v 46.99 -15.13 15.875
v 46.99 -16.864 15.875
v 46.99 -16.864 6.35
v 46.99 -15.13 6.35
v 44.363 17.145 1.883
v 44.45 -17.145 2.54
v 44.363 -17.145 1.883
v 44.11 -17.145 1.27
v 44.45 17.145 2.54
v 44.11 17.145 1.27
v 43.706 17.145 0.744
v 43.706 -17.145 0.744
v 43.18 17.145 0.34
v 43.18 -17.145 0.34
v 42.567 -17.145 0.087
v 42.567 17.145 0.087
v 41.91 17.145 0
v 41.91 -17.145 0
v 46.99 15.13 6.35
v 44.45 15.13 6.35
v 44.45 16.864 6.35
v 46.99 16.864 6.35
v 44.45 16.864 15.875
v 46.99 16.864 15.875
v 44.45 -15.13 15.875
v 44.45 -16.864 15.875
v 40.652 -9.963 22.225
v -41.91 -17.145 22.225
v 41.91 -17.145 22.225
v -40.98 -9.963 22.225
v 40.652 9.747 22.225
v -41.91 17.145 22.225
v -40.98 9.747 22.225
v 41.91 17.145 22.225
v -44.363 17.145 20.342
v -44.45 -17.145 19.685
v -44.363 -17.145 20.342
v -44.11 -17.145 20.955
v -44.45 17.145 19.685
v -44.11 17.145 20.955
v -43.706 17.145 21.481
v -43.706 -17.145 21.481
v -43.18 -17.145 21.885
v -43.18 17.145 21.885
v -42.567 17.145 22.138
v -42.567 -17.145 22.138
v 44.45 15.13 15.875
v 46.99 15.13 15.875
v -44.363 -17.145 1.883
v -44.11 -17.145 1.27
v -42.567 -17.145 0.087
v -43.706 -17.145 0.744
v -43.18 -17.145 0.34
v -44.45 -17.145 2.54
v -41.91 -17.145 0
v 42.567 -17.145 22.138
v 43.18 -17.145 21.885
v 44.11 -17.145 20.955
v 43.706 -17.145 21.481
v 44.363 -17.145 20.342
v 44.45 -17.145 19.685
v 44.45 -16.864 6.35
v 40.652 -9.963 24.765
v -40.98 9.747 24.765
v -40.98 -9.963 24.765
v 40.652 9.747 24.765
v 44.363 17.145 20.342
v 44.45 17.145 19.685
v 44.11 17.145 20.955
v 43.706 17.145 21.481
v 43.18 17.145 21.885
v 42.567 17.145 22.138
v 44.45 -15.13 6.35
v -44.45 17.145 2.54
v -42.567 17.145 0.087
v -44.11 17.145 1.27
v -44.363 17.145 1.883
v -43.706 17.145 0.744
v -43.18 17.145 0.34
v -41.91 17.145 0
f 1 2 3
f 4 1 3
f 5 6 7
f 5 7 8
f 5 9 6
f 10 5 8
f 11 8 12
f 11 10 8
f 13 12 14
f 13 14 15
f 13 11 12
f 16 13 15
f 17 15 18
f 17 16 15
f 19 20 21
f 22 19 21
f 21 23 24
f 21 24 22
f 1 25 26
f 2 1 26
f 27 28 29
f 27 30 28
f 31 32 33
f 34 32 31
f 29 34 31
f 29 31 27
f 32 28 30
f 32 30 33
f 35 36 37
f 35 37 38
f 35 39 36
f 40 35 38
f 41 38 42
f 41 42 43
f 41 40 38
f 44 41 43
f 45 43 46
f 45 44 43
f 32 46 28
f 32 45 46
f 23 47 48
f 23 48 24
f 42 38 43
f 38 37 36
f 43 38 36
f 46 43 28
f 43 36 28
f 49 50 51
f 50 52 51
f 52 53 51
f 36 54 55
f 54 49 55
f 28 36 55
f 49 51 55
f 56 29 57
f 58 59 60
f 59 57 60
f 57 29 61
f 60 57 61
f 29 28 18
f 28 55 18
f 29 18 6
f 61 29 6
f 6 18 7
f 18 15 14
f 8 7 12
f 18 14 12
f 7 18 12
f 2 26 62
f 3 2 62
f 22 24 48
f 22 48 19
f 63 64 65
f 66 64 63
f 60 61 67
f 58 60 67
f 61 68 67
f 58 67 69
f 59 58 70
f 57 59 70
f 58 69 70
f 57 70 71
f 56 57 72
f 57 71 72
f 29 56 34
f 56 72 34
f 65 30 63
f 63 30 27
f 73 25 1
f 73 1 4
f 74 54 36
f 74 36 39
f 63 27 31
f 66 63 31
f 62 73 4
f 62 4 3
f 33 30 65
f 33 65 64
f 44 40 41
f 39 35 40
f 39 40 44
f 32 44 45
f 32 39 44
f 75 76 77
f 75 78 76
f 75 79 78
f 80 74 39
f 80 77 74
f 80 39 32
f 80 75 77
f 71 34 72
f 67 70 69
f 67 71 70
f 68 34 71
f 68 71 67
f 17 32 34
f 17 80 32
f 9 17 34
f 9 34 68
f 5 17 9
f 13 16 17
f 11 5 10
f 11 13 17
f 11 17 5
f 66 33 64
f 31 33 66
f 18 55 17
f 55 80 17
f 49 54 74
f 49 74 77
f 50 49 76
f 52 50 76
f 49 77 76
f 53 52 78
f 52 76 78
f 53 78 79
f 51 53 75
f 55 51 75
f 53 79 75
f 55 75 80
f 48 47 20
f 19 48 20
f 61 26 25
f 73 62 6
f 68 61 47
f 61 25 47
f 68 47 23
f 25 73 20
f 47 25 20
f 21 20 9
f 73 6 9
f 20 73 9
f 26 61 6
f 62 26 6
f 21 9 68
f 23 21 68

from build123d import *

# Parameters (mm, degrees)
SKETCH1_W           = 88.9
SKETCH1_H           = 34.29
BOSS_EXTRUDE1_DEPTH = 22.225
FILLET1_R           = 2.54
SKETCH2_W           = 9.52578488
SKETCH2_H           = 1.733476194
BOSS_EXTRUDE2_DEPTH = 2.54
SKETCH3_W           = 81.632090284
SKETCH3_H           = 19.709925483
BOSS_EXTRUDE3_DEPTH = 2.54


with BuildPart() as part:
    # Sketch1 → Boss-Extrude1 (new body)
    with BuildSketch(Plane.XY):
        Rectangle(SKETCH1_W, SKETCH1_H)
    extrude(amount=BOSS_EXTRUDE1_DEPTH)

    # Fillet1
    fillet1_edges = [part.edges().sort_by_distance(p)[0] for p in [
        (-44.45, 0, 22.225),
        (44.45, 0, 22.225),
        (-44.45, 0, 0),
        (44.45, 0, 0),
    ]]
    fillet(fillet1_edges, radius=FILLET1_R)

    # Sketch2 → Boss-Extrude2 (add)
    with BuildSketch(Plane(origin=(44.45, 0, 0), x_dir=(0, 0, -1), z_dir=(1, 0, 0))):
        with Locations((-11.1125, 15.996812485)):
            Rectangle(SKETCH2_W, SKETCH2_H)
    boss_extrude2 = extrude(amount=BOSS_EXTRUDE2_DEPTH)

    # Mirror1: Boss-Extrude2 across plane
    add(boss_extrude2.mirror(Plane.ZX))

    # Sketch3 → Boss-Extrude3 (add)
    with BuildSketch(Plane.XY.offset(22.225)):
        with Locations((-0.163591475, -0.108131836)):
            Rectangle(SKETCH3_W, SKETCH3_H)
    extrude(amount=BOSS_EXTRUDE3_DEPTH)


solid = part.part
